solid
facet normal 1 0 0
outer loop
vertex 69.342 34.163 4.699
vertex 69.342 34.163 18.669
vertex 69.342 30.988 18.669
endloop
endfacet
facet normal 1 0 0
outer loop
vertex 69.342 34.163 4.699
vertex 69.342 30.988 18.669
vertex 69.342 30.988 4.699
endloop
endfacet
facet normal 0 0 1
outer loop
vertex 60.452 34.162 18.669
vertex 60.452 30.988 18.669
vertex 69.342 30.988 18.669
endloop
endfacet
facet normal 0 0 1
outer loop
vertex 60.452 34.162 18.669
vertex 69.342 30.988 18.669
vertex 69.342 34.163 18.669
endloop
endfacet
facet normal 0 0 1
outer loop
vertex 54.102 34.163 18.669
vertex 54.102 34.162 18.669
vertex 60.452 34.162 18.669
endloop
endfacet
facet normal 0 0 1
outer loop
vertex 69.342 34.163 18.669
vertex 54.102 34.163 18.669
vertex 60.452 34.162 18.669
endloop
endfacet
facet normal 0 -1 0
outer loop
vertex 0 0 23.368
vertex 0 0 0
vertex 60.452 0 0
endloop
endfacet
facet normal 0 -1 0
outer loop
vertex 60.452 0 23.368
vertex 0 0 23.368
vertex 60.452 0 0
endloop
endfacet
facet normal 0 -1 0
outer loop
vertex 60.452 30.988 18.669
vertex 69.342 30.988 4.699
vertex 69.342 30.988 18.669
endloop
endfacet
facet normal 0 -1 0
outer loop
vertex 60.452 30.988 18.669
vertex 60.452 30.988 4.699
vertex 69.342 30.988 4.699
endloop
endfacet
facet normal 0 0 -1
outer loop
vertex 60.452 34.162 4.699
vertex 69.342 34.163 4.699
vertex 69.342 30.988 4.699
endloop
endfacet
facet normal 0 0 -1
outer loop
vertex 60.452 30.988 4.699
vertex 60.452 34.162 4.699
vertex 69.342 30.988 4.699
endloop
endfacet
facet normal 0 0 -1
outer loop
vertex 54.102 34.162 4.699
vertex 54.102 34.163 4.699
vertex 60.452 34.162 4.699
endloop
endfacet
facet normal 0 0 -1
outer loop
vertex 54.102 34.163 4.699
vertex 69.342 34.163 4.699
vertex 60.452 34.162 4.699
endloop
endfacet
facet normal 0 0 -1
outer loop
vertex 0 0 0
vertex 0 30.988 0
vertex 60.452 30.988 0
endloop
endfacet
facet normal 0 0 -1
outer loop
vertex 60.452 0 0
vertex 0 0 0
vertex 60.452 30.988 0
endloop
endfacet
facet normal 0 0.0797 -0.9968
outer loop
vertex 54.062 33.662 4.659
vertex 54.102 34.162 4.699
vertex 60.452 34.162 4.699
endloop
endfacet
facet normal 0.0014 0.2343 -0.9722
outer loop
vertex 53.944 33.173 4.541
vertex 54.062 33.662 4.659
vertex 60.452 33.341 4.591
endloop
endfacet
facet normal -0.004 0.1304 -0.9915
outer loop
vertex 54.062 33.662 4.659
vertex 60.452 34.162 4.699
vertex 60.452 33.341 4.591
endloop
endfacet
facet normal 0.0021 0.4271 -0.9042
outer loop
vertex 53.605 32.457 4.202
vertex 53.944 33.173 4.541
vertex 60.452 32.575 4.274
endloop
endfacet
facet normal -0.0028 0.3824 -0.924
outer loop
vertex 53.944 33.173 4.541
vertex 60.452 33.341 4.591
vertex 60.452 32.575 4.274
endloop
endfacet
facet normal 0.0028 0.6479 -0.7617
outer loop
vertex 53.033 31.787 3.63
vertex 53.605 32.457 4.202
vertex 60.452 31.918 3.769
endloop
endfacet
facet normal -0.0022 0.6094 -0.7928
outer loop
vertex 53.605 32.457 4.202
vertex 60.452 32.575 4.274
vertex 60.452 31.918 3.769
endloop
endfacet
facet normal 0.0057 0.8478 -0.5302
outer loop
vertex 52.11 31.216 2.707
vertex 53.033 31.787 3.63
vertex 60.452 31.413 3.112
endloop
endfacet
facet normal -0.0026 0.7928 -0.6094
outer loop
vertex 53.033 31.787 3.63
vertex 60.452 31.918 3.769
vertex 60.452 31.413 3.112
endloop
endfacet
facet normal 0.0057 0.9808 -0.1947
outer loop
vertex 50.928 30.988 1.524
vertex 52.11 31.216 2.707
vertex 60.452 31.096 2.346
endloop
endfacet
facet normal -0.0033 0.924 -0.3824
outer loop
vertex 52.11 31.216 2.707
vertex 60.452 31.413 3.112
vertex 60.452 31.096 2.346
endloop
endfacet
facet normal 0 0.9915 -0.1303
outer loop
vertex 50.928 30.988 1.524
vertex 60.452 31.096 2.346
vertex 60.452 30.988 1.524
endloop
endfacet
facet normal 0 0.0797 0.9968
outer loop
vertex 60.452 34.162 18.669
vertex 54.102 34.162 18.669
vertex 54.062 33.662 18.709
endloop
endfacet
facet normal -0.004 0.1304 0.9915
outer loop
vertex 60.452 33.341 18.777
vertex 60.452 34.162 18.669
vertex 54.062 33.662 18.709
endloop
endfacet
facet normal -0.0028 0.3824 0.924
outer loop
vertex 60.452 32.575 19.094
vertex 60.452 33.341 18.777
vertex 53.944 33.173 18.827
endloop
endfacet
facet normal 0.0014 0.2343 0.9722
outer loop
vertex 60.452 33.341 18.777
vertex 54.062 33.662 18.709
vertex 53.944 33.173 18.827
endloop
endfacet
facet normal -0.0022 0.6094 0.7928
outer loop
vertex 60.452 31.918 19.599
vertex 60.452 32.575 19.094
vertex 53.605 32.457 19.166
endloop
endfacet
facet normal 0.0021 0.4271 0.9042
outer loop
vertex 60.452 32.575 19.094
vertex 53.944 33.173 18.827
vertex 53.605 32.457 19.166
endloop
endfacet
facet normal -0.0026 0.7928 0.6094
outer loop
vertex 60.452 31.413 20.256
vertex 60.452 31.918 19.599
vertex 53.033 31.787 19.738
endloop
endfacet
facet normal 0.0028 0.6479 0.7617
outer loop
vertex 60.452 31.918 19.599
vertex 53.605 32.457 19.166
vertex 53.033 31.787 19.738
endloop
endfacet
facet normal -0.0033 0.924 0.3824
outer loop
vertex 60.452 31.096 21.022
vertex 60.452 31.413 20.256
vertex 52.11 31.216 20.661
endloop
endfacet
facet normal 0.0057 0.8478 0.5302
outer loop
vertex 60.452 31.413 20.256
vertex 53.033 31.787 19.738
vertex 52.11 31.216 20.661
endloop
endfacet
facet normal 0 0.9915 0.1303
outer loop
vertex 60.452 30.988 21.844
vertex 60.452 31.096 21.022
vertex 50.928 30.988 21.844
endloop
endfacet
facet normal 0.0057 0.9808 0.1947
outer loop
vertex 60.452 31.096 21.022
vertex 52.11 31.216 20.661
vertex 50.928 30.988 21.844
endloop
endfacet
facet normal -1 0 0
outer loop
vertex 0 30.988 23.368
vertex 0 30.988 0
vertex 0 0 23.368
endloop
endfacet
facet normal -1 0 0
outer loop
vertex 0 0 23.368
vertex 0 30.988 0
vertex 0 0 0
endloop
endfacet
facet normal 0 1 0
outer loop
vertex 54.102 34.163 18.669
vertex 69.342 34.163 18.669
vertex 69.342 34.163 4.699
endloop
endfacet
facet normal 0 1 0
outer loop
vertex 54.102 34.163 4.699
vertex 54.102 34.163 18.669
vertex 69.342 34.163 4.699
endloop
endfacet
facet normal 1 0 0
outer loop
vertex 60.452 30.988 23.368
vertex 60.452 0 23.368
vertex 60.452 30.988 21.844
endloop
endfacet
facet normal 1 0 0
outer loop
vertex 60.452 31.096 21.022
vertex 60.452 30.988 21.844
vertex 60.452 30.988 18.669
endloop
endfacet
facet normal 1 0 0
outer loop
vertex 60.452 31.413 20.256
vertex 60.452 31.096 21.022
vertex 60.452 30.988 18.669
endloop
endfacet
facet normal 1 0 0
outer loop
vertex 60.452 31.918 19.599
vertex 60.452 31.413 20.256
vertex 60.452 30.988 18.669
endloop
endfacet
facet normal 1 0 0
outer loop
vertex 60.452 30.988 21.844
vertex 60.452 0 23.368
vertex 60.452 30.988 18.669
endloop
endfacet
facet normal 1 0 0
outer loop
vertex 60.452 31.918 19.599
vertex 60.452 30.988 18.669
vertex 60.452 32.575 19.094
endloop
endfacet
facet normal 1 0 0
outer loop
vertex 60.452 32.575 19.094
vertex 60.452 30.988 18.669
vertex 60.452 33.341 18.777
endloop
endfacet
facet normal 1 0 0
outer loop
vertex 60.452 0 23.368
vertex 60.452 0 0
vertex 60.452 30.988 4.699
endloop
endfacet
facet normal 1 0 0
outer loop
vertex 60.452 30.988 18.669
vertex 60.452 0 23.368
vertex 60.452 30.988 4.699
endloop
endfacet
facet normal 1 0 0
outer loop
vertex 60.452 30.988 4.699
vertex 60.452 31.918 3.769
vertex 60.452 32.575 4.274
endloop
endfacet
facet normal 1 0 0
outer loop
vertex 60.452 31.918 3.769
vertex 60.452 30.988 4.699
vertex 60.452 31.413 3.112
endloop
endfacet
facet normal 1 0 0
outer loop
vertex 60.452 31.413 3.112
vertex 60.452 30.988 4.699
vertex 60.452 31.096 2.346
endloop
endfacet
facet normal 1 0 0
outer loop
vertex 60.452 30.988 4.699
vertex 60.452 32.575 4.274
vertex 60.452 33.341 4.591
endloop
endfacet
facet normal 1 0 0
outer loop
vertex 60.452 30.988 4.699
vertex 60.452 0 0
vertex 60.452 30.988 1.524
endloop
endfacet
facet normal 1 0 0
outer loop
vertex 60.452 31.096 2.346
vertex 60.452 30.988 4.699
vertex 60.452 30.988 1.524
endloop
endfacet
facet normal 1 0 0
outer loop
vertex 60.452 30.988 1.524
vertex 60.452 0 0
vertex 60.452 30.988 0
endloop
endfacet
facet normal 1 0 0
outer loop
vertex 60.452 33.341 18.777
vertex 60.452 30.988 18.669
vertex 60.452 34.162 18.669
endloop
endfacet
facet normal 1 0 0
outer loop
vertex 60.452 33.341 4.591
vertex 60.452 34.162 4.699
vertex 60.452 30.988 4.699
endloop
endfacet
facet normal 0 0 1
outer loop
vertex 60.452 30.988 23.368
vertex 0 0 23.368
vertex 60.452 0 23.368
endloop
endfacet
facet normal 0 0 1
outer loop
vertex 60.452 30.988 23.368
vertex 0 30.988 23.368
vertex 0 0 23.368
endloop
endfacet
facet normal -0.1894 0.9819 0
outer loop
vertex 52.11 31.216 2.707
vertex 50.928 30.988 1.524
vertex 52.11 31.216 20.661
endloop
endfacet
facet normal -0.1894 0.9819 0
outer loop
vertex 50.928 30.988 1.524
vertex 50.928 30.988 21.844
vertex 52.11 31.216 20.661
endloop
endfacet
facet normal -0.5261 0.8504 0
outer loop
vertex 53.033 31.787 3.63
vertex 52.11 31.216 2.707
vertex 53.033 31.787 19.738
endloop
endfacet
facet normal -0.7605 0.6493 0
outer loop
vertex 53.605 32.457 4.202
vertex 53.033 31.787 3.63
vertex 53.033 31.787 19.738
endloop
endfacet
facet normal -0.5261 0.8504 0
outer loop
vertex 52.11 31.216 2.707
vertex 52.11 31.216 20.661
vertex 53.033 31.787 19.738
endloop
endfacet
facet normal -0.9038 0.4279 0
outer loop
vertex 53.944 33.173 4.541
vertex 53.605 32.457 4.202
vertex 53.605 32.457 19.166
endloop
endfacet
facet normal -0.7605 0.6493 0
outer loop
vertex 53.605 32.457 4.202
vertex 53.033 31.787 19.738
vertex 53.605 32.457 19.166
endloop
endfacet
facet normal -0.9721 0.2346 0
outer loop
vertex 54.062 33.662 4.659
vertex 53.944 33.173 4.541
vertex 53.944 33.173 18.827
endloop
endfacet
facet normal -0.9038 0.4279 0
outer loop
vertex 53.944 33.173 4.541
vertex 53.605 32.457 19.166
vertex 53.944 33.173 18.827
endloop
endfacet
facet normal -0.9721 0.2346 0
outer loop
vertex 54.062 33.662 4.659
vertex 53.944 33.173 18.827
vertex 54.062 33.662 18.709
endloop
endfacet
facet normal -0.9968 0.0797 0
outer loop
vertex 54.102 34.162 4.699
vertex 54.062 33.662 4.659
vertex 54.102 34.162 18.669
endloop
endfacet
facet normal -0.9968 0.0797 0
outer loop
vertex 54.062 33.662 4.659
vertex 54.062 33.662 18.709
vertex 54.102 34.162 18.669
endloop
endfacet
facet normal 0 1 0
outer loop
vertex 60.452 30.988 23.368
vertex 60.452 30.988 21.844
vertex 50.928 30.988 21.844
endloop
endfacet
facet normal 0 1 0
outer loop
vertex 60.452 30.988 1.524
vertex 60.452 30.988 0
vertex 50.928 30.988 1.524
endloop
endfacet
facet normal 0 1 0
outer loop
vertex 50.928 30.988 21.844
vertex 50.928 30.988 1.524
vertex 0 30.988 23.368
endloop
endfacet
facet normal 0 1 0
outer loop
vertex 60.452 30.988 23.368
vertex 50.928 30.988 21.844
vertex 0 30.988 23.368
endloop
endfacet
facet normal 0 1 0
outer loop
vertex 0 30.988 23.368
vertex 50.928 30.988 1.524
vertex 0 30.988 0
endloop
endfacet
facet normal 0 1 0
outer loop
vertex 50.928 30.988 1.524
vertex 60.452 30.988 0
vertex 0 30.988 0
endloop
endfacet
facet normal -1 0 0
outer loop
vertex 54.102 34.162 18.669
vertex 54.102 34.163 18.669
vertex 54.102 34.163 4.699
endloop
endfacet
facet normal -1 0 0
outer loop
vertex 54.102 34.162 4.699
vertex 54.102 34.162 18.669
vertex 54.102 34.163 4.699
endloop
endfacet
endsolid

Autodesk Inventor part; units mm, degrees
ref_plane "YZ Plane" through (0, 0, 0) normal (1, 0, 0) x (0, 1, 0)
ref_plane "XZ Plane" through (0, 0, 0) normal (0, 1, 0) x (-1, 0, 0)
ref_plane "XY Plane" through (0, 0, 0) normal (0, 0, 1) x (1, 0, 0)
sketch "Sketch1" plane through (0, 0, 0) normal (0, 0, 1) x (1, 0, 0)
  line L0 (0, 0) -> (60.452, 0)
  line L1 (60.452, 0) -> (60.452, 30.988)
  line L2 (60.452, 30.988) -> (0, 30.988)
  line L3 (0, 30.988) -> (0, 0)
  dimension "d0" = 60.452
  dimension "d1" = 30.988
extrude "Extrusion1" add sketch "Sketch1" along normal blind 23.368
sketch "Sketch2" plane through (60.452, 0, 0) normal (1, 0, 0) x (0, 0, -1)
  line L0 (-4.699, 30.988) -> (-18.669, 30.988)
  line L1 (-18.669, 30.988) -> (-18.669, 34.163)
  line L2 (-18.669, 34.163) -> (-4.699, 34.163)
  line L3 (-4.699, 34.163) -> (-4.699, 30.988)
  line L4 (0, 30.988) -> (-23.368, 30.988) projected
  point P0 (0, 0)
  point P1 (-11.684, 34.163)
  point P2 (-11.684, 30.988)
  point P3 (-11.684, 30.988)
  dimension "d4" = 13.97
  dimension "d5" = 3.175
extrude "Extrusion2" add sketch "Sketch2" along normal blind 8.89 and the other way blind 6.35
fillet "Fillet1" radius 3.175 3 edges at (54.102, 30.988, 11.684) (57.277, 30.988, 18.669) (57.277, 30.988, 4.699)
properties part number "ASDSBattery" material "ABS Plastic"
